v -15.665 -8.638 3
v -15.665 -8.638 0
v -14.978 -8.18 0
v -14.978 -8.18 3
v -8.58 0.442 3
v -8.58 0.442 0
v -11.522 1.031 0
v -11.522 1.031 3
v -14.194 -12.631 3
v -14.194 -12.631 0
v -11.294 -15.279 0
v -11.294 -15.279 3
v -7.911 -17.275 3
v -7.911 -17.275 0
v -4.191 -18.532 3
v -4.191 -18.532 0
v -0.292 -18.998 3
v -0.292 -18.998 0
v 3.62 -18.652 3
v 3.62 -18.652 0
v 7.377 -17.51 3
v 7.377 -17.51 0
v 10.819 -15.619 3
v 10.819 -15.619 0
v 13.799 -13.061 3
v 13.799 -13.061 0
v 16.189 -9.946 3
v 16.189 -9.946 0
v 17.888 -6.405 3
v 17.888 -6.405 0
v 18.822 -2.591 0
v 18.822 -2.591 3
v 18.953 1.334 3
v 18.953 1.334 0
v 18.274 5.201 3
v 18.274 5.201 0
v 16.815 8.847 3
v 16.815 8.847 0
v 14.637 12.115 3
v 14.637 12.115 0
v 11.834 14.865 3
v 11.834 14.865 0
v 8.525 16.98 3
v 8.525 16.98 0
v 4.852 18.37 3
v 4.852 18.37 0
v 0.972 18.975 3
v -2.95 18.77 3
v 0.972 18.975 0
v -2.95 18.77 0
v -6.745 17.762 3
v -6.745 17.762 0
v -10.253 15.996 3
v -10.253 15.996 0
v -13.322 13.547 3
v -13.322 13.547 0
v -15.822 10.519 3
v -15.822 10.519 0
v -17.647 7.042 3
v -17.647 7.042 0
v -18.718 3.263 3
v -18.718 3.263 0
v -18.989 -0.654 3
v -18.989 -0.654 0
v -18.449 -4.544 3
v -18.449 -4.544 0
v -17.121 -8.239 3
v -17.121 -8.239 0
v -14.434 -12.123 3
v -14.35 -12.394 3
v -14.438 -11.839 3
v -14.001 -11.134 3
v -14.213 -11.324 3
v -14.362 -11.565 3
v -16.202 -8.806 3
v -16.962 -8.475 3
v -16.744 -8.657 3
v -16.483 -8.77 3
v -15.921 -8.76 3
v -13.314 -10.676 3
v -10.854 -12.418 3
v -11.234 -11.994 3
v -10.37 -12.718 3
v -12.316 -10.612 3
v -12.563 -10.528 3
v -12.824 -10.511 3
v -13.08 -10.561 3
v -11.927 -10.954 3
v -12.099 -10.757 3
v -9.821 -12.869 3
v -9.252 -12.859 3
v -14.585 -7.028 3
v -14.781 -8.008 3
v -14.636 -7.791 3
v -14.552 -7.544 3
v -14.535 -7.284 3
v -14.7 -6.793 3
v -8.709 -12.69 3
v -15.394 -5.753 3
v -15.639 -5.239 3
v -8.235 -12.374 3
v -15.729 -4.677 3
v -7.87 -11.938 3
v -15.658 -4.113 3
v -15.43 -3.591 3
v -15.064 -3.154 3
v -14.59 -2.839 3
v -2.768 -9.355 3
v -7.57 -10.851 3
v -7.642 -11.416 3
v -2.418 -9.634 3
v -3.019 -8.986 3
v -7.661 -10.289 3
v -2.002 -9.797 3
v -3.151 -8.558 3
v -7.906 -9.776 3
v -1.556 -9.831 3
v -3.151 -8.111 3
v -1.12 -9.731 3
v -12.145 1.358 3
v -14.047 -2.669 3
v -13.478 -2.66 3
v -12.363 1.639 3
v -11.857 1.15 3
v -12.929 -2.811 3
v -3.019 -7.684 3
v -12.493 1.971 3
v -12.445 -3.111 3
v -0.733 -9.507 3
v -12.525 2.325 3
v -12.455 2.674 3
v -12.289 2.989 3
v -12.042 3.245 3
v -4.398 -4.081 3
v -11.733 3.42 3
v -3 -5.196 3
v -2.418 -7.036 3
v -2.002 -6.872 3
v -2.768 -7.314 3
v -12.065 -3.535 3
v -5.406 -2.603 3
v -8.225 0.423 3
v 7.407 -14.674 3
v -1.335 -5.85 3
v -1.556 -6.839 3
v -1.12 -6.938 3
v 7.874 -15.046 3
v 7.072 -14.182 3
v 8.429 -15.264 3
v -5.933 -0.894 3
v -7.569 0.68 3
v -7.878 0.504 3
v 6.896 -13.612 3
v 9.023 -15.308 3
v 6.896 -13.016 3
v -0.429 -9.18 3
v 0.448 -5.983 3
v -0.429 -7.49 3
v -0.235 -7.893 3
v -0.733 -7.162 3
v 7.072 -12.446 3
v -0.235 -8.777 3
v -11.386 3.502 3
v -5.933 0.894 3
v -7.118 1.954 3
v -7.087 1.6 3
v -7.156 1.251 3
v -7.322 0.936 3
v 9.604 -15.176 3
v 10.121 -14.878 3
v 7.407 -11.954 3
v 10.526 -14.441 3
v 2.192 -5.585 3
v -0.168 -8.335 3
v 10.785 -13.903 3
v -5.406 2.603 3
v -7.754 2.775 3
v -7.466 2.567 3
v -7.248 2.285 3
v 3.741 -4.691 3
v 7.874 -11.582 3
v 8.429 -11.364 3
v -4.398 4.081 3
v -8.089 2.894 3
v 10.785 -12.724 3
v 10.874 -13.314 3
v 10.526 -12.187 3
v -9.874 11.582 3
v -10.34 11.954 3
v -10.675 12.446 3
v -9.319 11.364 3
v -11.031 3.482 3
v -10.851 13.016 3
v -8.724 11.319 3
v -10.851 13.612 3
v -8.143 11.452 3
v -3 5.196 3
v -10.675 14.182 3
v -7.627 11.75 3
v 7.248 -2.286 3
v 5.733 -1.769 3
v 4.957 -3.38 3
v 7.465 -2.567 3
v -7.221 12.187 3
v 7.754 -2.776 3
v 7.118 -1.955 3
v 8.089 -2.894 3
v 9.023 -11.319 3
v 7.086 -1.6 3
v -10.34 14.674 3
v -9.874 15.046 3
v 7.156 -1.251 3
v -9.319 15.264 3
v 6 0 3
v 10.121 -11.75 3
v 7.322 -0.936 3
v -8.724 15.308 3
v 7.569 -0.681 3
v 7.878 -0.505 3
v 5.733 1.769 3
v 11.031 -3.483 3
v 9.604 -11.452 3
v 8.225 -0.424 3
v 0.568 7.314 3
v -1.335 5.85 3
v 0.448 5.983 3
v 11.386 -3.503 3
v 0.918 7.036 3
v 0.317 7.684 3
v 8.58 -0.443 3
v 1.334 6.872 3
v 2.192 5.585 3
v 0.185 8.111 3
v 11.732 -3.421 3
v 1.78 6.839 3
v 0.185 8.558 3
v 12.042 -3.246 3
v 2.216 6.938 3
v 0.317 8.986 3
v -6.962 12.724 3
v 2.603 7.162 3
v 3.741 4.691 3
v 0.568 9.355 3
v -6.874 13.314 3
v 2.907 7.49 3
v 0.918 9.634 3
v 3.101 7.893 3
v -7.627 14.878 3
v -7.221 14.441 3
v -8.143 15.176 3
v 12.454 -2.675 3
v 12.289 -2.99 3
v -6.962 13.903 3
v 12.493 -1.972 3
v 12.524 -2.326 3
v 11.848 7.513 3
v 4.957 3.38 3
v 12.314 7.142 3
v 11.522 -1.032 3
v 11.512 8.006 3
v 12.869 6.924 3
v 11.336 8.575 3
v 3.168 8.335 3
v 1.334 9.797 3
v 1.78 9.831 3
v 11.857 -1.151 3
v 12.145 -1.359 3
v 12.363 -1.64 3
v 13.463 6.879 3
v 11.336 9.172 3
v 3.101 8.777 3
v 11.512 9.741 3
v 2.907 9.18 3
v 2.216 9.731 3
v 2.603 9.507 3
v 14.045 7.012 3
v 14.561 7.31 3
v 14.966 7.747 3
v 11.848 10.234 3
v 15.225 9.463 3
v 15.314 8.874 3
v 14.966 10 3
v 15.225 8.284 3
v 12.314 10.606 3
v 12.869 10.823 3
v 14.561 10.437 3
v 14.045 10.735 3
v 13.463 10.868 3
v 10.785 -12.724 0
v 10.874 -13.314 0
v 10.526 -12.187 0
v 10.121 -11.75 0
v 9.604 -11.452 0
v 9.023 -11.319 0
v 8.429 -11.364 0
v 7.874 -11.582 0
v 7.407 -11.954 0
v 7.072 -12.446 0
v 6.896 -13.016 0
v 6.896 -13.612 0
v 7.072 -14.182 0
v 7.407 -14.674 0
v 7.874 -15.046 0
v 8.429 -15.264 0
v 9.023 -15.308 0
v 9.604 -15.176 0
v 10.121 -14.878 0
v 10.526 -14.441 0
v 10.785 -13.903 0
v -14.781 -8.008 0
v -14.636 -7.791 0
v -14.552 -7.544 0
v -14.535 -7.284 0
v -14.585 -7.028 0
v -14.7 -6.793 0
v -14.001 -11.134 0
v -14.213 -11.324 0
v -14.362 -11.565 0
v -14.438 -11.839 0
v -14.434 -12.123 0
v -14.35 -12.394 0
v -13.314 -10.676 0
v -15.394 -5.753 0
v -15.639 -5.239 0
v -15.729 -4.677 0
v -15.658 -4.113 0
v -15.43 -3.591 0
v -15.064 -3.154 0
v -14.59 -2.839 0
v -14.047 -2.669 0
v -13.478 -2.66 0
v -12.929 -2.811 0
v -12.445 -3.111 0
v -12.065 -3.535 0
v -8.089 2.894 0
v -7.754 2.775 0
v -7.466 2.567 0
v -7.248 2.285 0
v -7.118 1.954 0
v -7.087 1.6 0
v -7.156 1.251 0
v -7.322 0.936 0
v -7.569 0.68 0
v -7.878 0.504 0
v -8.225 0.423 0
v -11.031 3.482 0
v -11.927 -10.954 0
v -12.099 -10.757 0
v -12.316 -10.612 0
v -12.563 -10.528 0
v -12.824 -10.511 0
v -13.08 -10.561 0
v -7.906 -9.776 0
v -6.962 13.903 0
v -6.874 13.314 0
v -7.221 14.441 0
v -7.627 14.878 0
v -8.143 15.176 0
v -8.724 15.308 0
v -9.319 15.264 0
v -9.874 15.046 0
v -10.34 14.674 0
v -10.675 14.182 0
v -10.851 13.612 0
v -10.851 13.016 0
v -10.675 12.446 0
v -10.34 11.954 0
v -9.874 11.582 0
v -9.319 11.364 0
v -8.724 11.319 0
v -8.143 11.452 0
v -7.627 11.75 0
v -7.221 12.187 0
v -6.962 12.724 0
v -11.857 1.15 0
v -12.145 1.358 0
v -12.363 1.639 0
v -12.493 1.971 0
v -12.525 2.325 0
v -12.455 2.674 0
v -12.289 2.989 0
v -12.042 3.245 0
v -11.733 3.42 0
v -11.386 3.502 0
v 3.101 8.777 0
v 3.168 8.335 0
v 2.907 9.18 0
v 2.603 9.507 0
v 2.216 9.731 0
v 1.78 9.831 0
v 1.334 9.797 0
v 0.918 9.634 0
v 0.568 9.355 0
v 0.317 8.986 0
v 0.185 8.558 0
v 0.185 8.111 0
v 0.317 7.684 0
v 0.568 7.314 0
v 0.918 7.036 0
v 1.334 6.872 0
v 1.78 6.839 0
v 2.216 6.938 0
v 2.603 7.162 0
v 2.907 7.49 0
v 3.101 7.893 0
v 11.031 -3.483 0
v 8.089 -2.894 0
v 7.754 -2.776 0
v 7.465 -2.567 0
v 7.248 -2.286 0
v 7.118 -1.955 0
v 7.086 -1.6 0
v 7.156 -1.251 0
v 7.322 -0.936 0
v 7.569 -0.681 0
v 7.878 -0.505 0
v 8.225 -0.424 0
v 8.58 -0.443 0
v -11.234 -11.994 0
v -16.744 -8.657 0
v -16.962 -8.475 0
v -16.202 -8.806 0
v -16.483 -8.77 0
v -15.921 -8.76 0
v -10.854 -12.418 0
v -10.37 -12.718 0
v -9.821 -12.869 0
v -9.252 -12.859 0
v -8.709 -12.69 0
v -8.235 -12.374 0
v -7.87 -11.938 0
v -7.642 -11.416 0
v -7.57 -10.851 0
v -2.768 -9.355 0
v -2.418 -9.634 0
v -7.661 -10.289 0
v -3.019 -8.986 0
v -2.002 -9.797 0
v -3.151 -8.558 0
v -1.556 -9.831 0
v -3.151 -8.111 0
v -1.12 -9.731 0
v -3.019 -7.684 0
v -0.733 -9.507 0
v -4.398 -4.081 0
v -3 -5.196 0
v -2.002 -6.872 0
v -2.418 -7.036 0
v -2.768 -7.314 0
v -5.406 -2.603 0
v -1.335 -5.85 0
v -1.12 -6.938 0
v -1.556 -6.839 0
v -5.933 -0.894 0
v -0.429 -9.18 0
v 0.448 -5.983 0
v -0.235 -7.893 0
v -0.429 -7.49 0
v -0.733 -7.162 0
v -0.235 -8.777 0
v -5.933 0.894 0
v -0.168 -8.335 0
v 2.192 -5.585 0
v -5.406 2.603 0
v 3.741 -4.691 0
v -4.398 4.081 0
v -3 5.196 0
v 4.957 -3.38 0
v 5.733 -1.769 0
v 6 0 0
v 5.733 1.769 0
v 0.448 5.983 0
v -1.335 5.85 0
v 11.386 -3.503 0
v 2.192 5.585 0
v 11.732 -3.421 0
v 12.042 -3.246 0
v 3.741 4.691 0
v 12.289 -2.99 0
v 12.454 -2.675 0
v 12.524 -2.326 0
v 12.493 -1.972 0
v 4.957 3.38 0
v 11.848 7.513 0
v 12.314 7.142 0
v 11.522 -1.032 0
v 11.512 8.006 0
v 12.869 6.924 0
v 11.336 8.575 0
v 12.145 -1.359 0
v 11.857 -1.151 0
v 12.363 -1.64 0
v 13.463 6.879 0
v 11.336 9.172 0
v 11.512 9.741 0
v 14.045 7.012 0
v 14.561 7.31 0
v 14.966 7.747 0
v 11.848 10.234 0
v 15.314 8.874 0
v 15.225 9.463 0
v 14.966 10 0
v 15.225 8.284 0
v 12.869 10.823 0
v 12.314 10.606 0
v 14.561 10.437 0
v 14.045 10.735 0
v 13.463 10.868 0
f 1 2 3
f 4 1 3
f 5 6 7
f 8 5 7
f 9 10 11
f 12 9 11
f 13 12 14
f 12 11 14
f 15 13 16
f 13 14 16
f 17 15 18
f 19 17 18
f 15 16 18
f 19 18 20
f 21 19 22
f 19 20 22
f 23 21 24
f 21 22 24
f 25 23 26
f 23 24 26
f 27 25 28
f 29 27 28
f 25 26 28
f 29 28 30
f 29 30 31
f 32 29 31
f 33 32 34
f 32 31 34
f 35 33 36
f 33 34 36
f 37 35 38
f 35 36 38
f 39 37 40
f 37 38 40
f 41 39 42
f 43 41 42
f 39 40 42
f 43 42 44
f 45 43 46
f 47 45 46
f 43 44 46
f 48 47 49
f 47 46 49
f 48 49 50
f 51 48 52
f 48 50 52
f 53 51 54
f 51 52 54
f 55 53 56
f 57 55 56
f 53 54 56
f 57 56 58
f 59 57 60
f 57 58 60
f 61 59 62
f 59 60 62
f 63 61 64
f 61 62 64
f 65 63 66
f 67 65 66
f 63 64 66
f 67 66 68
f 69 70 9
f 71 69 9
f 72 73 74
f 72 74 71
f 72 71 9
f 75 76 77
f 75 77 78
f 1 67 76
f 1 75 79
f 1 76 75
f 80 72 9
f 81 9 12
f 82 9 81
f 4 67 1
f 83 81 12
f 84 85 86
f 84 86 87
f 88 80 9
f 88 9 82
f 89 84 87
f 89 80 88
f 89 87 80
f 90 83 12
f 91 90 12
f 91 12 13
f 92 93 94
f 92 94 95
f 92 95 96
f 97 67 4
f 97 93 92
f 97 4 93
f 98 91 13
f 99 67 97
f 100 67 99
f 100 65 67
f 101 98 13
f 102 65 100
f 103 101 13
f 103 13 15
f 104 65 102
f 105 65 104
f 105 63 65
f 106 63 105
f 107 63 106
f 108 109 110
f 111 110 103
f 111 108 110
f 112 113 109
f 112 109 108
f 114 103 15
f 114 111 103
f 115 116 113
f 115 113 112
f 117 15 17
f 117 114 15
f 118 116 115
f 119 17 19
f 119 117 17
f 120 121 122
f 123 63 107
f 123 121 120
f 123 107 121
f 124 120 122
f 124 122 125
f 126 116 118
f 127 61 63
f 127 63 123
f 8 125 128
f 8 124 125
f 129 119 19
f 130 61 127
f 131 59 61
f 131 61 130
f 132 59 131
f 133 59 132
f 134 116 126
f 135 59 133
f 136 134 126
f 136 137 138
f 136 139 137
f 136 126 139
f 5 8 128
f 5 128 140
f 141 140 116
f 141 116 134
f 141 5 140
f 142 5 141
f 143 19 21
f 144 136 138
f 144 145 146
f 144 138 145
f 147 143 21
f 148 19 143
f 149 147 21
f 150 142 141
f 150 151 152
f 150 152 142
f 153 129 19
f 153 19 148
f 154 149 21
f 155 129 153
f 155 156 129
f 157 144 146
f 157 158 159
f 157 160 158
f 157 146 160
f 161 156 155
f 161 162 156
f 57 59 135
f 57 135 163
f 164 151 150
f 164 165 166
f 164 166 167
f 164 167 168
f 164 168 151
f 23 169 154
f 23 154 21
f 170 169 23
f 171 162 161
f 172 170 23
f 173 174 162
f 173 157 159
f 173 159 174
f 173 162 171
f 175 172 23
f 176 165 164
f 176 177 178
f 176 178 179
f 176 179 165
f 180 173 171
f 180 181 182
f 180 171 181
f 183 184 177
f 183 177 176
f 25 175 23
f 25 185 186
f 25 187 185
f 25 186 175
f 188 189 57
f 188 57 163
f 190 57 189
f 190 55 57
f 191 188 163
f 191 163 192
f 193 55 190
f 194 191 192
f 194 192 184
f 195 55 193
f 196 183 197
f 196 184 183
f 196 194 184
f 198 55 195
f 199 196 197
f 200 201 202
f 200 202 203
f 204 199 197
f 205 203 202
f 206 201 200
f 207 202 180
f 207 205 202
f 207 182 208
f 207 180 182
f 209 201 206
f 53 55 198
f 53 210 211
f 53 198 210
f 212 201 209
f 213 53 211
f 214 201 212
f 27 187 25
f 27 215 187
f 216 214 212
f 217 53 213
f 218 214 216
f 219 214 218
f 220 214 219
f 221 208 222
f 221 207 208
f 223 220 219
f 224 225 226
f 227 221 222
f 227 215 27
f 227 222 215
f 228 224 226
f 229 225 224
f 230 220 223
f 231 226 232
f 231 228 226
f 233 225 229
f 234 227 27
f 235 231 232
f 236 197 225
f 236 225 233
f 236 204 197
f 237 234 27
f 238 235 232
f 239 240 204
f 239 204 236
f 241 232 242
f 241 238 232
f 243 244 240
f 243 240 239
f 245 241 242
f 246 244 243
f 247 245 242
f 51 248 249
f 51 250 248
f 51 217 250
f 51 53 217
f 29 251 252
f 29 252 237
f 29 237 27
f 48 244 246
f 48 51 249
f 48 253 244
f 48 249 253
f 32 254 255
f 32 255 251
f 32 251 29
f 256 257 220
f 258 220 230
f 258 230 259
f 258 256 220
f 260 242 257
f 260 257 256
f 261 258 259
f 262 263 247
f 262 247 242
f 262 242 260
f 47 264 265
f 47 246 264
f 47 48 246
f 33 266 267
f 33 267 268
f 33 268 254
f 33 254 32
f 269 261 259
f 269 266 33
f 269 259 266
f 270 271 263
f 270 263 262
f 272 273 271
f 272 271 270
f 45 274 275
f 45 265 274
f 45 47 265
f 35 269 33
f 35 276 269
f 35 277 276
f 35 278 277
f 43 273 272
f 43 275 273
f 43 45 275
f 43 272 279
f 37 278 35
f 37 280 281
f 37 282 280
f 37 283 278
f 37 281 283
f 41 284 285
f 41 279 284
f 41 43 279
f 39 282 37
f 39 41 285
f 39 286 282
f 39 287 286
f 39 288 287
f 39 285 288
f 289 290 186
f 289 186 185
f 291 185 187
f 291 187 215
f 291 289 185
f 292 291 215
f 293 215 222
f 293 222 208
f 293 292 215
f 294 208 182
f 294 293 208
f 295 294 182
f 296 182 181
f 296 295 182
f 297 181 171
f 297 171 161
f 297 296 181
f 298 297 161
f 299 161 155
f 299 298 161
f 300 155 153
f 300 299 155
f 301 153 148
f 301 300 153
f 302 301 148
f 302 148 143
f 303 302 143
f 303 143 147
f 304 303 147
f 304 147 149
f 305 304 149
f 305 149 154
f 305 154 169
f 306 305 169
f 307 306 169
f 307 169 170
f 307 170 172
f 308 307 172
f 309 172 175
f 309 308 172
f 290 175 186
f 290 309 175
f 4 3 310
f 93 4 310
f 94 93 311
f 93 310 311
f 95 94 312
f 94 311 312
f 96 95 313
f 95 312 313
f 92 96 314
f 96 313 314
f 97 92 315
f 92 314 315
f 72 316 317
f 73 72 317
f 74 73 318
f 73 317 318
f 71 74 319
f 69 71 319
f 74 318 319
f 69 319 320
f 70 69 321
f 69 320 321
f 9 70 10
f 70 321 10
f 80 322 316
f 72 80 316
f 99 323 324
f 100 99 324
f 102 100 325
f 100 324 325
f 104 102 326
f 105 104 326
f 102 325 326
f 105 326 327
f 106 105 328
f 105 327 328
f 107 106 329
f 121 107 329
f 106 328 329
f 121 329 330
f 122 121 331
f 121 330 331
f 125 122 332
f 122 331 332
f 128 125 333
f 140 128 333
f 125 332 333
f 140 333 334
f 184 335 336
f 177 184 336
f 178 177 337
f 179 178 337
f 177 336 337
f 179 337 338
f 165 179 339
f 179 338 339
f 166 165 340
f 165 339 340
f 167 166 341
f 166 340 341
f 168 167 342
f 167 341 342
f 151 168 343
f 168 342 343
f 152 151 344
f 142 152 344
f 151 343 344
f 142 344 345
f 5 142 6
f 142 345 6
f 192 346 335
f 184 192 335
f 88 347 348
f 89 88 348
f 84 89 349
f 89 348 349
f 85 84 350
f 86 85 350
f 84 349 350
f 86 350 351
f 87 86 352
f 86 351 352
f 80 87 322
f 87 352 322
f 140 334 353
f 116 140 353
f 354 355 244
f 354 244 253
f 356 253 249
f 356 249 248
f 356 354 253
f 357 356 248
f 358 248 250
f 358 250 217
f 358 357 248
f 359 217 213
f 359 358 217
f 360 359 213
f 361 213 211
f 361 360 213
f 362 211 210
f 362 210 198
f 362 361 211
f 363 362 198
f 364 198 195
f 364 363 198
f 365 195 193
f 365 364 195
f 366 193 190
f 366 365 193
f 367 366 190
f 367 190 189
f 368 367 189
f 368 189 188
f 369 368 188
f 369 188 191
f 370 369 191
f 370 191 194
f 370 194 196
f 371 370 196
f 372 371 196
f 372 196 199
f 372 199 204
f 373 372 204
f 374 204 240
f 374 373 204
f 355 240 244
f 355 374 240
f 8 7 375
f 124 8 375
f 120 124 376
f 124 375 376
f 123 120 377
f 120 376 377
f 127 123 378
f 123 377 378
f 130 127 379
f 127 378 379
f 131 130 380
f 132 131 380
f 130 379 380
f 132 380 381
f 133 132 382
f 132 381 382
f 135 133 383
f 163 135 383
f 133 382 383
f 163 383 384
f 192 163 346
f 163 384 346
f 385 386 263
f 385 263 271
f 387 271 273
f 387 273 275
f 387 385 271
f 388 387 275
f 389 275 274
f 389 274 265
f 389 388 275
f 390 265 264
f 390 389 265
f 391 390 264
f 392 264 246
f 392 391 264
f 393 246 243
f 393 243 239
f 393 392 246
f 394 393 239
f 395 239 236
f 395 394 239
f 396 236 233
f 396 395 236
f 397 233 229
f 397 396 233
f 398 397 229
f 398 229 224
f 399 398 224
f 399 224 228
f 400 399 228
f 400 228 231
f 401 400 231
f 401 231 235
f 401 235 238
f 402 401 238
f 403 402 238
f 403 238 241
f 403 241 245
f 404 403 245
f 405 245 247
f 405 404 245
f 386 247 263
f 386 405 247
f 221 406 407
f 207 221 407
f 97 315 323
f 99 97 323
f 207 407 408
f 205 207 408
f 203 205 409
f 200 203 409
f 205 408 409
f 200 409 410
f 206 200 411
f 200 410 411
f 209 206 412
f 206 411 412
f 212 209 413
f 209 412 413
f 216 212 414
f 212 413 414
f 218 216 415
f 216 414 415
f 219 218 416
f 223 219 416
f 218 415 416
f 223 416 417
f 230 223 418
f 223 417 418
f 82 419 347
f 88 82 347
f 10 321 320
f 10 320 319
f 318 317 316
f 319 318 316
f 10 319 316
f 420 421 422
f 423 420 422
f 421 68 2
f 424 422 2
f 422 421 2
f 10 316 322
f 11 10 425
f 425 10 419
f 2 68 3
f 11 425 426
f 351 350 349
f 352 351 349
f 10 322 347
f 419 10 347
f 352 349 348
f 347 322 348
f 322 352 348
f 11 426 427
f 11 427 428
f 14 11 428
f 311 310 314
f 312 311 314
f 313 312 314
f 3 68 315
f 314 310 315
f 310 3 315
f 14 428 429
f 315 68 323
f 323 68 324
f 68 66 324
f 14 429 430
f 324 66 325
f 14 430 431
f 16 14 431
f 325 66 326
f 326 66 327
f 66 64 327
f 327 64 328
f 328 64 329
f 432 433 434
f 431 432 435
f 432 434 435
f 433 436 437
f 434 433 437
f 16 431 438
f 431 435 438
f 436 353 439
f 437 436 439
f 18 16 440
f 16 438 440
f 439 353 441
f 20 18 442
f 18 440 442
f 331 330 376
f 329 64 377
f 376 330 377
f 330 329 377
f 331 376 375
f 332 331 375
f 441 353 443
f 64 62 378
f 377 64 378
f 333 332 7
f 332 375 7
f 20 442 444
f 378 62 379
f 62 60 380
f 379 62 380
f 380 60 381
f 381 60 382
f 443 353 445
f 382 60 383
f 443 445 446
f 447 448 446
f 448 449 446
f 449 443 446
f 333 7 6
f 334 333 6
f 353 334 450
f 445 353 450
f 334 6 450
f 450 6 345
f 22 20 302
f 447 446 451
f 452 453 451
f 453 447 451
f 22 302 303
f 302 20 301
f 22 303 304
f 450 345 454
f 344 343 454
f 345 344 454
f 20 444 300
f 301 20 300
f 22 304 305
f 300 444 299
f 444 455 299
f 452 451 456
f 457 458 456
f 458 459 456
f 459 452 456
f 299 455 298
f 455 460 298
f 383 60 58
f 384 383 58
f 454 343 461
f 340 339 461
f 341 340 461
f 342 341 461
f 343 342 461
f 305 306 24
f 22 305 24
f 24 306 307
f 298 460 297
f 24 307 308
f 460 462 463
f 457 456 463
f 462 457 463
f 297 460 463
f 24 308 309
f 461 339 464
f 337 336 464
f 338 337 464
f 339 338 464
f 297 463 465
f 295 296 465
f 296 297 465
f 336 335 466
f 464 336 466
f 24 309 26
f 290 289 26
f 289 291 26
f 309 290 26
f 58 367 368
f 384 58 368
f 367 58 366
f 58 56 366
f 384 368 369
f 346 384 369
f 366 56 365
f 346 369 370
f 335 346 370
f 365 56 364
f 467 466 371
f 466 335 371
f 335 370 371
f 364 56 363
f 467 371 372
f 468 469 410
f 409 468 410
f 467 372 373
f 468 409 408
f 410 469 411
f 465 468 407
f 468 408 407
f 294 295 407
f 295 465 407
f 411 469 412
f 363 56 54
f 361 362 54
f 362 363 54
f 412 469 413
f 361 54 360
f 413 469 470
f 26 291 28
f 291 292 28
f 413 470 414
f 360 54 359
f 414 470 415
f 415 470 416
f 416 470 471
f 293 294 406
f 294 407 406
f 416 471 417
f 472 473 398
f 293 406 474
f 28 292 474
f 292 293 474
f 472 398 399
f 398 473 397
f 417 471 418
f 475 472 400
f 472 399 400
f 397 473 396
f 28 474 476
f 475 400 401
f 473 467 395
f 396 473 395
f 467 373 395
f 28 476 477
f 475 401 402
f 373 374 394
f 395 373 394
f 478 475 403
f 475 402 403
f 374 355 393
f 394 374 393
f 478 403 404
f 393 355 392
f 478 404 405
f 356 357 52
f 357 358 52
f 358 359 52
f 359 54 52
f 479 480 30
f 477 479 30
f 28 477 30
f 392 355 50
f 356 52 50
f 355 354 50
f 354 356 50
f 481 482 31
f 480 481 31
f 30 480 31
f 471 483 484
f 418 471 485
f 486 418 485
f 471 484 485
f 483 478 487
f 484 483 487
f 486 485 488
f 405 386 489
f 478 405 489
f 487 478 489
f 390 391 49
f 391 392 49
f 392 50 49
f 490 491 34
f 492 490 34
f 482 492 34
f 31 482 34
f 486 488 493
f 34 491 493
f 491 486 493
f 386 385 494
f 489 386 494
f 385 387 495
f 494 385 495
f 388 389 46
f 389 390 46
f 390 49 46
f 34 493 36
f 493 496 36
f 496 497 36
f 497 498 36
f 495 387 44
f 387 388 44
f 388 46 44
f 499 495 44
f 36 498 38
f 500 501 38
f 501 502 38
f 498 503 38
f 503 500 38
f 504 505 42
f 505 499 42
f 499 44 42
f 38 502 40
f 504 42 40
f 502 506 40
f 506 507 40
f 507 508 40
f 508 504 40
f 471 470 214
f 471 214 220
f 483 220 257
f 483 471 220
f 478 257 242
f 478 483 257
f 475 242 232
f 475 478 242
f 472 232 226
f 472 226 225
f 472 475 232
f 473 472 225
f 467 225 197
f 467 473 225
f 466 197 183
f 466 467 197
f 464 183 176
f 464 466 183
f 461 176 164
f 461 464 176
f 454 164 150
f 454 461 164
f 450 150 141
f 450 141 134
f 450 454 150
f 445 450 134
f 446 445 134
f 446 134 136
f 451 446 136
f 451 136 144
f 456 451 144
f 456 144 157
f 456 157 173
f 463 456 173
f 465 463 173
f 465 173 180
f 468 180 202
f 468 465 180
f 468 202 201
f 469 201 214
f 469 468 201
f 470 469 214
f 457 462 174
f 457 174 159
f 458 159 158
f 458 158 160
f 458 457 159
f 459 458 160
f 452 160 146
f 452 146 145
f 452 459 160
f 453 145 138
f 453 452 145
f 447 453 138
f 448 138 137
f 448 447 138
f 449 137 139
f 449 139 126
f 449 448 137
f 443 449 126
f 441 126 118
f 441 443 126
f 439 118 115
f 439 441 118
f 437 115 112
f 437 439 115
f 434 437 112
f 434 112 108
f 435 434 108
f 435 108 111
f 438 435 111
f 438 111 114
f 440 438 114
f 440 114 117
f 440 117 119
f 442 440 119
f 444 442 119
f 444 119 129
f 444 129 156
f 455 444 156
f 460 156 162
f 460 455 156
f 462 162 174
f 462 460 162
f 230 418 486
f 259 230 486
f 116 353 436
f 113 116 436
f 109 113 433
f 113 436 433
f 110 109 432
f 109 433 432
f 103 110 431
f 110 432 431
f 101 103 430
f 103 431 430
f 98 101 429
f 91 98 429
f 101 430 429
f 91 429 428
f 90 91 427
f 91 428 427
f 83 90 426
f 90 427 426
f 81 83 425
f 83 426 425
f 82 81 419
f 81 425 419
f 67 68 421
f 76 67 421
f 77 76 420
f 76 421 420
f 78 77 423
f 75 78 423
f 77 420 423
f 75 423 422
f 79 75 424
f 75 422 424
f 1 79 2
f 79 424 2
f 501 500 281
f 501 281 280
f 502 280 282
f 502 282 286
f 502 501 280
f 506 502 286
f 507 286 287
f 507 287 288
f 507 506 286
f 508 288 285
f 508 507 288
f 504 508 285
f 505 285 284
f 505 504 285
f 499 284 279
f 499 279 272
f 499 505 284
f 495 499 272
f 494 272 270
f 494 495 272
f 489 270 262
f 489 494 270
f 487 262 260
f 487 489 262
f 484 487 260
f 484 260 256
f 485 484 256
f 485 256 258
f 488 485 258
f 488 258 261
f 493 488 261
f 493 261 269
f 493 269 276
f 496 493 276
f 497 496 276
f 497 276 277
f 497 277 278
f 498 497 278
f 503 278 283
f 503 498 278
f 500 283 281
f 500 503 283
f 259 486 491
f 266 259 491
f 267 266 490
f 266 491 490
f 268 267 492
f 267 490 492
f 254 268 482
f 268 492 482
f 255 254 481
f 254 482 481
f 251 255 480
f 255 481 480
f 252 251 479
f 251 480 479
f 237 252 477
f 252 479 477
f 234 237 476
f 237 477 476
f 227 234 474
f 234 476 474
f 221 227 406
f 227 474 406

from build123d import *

# Parameters (mm, degrees)
SKETCH1_R           = 2
SKETCH1_R_2         = 6
SKETCH1_R_3         = 1.5
BOSS_EXTRUDE1_DEPTH = 3


with BuildPart() as part:
    # Sketch1 → Boss-Extrude1 (new body)
    with BuildSketch(Plane.XY):
        with BuildLine():
            Line((-12.06516619, -3.534722735), (-7.905685951, -9.775614029))
            ThreePointArc((-7.905685951, -9.775614029), (-8.460728899, -12.549046438), (-11.234161307, -11.99400349))
            Line((-11.234161307, -11.99400349), (-11.927408014, -10.953854941))
            ThreePointArc((-11.927408014, -10.953854941), (-12.563289537, -10.527895875), (-13.314124218, -10.676333467))
            Line((-13.314124218, -10.676333467), (-14.001074492, -11.1341777))
            ThreePointArc((-14.001074492, -11.1341777), (-14.438315509, -11.838795077), (-14.193503634, -12.631090792))
            ThreePointArc((-14.193503634, -12.631090792), (15.810257944, 10.537349939), (-17.120545284, -8.239352474))
            ThreePointArc((-17.120545284, -8.239352474), (-16.483484999, -8.770219263), (-15.664866588, -8.637821183))
            Line((-15.664866588, -8.637821183), (-14.977916314, -8.17997695))
            ThreePointArc((-14.977916314, -8.17997695), (-14.551957247, -7.544095427), (-14.70039484, -6.793260745))
            Line((-14.70039484, -6.793260745), (-15.393641546, -5.753112196))
            ThreePointArc((-15.393641546, -5.753112196), (-14.838598598, -2.979679788), (-12.06516619, -3.534722735))
        make_face()
        with Locations((-8.873557843, 13.313901427)):
            Circle(SKETCH1_R, mode=Mode.SUBTRACT)
        with Locations((13.31390139, 8.873557851)):
            Circle(SKETCH1_R, mode=Mode.SUBTRACT)
        with Locations((8.873557814, -13.313901383)):
            Circle(SKETCH1_R, mode=Mode.SUBTRACT)
        Circle(SKETCH1_R_2, mode=Mode.SUBTRACT)
        with Locations((1.668017187, 8.334729669)):
            Circle(SKETCH1_R_3, mode=Mode.SUBTRACT)
        with Locations((-1.668017187, -8.334729669)):
            Circle(SKETCH1_R_3, mode=Mode.SUBTRACT)
        with BuildLine():
            Line((-11.031102319, 3.482424676), (-8.089433024, 2.893712727))
            ThreePointArc((-8.089433024, 2.893712727), (-7.10903413, 1.422720542), (-8.580026315, 0.442321648))
            Line((-8.580026315, 0.442321648), (-11.52169561, 1.031033596))
            ThreePointArc((-11.52169561, 1.031033596), (-12.502094504, 2.502025781), (-11.031102319, 3.482424676))
        make_face(mode=Mode.SUBTRACT)
        with BuildLine():
            Line((11.03081381, -3.483353645), (8.089191886, -2.894405046))
            ThreePointArc((8.089191886, -2.894405046), (7.108911333, -1.423333995), (8.579982384, -0.443053442))
            Line((8.579982384, -0.443053442), (11.521604309, -1.032002041))
            ThreePointArc((11.521604309, -1.032002041), (12.501884862, -2.503073092), (11.03081381, -3.483353645))
        make_face(mode=Mode.SUBTRACT)
    extrude(amount=BOSS_EXTRUDE1_DEPTH)


solid = part.part
